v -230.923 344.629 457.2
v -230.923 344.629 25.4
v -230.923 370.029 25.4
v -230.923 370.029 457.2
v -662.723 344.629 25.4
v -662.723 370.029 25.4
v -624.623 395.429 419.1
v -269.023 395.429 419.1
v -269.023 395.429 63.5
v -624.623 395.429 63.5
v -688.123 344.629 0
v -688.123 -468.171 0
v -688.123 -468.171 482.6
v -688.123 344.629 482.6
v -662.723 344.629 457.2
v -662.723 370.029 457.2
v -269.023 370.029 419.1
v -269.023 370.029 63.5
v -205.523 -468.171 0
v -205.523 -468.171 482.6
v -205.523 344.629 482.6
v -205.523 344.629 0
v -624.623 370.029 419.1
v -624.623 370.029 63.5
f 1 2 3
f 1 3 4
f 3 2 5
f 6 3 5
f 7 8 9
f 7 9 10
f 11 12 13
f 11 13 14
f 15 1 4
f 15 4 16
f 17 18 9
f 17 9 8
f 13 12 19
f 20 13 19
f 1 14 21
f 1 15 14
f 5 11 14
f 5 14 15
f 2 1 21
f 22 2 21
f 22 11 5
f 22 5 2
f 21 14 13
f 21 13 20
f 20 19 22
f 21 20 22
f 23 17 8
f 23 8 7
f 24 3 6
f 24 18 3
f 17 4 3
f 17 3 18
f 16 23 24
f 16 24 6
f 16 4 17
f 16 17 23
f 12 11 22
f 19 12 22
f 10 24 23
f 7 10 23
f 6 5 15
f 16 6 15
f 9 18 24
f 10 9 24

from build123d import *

# Parameters (mm, degrees)
F0_W     = 482.6
F0_H     = 812.8
F1_DEPTH = 482.6
F2_W     = 355.6
F2_H     = 355.6
F3_DEPTH = 50.8
F2_W_2   = 431.8
F2_H_2   = 431.8
F4_DEPTH = 25.4


with BuildPart() as f1:
    # F0 (on Top) → F1 (new body)
    with BuildSketch(Plane.XY):
        with Locations((-446.823381, -61.770858)):
            Rectangle(F0_W, F0_H)
    extrude(amount=F1_DEPTH)

    # F2 (on face) → F3 (join)
    with BuildSketch(Plane(origin=(0, 344.629142, 0), x_dir=(-1, 0, 0), z_dir=(0, 1, 0))):
        with Locations((446.823381, 241.3)):
            Rectangle(F2_W, F2_H)
    extrude(amount=F3_DEPTH)

    # F2 (on face) → F4 (join)
    with BuildSketch(Plane(origin=(0, 344.629142, 0), x_dir=(-1, 0, 0), z_dir=(0, 1, 0))):
        with Locations((446.823381, 241.3)):
            Rectangle(F2_W_2, F2_H_2)
        with Locations((446.823381, 241.3)):
            Rectangle(F2_W, F2_H, mode=Mode.SUBTRACT)
    extrude(amount=F4_DEPTH)


solid = f1.part
